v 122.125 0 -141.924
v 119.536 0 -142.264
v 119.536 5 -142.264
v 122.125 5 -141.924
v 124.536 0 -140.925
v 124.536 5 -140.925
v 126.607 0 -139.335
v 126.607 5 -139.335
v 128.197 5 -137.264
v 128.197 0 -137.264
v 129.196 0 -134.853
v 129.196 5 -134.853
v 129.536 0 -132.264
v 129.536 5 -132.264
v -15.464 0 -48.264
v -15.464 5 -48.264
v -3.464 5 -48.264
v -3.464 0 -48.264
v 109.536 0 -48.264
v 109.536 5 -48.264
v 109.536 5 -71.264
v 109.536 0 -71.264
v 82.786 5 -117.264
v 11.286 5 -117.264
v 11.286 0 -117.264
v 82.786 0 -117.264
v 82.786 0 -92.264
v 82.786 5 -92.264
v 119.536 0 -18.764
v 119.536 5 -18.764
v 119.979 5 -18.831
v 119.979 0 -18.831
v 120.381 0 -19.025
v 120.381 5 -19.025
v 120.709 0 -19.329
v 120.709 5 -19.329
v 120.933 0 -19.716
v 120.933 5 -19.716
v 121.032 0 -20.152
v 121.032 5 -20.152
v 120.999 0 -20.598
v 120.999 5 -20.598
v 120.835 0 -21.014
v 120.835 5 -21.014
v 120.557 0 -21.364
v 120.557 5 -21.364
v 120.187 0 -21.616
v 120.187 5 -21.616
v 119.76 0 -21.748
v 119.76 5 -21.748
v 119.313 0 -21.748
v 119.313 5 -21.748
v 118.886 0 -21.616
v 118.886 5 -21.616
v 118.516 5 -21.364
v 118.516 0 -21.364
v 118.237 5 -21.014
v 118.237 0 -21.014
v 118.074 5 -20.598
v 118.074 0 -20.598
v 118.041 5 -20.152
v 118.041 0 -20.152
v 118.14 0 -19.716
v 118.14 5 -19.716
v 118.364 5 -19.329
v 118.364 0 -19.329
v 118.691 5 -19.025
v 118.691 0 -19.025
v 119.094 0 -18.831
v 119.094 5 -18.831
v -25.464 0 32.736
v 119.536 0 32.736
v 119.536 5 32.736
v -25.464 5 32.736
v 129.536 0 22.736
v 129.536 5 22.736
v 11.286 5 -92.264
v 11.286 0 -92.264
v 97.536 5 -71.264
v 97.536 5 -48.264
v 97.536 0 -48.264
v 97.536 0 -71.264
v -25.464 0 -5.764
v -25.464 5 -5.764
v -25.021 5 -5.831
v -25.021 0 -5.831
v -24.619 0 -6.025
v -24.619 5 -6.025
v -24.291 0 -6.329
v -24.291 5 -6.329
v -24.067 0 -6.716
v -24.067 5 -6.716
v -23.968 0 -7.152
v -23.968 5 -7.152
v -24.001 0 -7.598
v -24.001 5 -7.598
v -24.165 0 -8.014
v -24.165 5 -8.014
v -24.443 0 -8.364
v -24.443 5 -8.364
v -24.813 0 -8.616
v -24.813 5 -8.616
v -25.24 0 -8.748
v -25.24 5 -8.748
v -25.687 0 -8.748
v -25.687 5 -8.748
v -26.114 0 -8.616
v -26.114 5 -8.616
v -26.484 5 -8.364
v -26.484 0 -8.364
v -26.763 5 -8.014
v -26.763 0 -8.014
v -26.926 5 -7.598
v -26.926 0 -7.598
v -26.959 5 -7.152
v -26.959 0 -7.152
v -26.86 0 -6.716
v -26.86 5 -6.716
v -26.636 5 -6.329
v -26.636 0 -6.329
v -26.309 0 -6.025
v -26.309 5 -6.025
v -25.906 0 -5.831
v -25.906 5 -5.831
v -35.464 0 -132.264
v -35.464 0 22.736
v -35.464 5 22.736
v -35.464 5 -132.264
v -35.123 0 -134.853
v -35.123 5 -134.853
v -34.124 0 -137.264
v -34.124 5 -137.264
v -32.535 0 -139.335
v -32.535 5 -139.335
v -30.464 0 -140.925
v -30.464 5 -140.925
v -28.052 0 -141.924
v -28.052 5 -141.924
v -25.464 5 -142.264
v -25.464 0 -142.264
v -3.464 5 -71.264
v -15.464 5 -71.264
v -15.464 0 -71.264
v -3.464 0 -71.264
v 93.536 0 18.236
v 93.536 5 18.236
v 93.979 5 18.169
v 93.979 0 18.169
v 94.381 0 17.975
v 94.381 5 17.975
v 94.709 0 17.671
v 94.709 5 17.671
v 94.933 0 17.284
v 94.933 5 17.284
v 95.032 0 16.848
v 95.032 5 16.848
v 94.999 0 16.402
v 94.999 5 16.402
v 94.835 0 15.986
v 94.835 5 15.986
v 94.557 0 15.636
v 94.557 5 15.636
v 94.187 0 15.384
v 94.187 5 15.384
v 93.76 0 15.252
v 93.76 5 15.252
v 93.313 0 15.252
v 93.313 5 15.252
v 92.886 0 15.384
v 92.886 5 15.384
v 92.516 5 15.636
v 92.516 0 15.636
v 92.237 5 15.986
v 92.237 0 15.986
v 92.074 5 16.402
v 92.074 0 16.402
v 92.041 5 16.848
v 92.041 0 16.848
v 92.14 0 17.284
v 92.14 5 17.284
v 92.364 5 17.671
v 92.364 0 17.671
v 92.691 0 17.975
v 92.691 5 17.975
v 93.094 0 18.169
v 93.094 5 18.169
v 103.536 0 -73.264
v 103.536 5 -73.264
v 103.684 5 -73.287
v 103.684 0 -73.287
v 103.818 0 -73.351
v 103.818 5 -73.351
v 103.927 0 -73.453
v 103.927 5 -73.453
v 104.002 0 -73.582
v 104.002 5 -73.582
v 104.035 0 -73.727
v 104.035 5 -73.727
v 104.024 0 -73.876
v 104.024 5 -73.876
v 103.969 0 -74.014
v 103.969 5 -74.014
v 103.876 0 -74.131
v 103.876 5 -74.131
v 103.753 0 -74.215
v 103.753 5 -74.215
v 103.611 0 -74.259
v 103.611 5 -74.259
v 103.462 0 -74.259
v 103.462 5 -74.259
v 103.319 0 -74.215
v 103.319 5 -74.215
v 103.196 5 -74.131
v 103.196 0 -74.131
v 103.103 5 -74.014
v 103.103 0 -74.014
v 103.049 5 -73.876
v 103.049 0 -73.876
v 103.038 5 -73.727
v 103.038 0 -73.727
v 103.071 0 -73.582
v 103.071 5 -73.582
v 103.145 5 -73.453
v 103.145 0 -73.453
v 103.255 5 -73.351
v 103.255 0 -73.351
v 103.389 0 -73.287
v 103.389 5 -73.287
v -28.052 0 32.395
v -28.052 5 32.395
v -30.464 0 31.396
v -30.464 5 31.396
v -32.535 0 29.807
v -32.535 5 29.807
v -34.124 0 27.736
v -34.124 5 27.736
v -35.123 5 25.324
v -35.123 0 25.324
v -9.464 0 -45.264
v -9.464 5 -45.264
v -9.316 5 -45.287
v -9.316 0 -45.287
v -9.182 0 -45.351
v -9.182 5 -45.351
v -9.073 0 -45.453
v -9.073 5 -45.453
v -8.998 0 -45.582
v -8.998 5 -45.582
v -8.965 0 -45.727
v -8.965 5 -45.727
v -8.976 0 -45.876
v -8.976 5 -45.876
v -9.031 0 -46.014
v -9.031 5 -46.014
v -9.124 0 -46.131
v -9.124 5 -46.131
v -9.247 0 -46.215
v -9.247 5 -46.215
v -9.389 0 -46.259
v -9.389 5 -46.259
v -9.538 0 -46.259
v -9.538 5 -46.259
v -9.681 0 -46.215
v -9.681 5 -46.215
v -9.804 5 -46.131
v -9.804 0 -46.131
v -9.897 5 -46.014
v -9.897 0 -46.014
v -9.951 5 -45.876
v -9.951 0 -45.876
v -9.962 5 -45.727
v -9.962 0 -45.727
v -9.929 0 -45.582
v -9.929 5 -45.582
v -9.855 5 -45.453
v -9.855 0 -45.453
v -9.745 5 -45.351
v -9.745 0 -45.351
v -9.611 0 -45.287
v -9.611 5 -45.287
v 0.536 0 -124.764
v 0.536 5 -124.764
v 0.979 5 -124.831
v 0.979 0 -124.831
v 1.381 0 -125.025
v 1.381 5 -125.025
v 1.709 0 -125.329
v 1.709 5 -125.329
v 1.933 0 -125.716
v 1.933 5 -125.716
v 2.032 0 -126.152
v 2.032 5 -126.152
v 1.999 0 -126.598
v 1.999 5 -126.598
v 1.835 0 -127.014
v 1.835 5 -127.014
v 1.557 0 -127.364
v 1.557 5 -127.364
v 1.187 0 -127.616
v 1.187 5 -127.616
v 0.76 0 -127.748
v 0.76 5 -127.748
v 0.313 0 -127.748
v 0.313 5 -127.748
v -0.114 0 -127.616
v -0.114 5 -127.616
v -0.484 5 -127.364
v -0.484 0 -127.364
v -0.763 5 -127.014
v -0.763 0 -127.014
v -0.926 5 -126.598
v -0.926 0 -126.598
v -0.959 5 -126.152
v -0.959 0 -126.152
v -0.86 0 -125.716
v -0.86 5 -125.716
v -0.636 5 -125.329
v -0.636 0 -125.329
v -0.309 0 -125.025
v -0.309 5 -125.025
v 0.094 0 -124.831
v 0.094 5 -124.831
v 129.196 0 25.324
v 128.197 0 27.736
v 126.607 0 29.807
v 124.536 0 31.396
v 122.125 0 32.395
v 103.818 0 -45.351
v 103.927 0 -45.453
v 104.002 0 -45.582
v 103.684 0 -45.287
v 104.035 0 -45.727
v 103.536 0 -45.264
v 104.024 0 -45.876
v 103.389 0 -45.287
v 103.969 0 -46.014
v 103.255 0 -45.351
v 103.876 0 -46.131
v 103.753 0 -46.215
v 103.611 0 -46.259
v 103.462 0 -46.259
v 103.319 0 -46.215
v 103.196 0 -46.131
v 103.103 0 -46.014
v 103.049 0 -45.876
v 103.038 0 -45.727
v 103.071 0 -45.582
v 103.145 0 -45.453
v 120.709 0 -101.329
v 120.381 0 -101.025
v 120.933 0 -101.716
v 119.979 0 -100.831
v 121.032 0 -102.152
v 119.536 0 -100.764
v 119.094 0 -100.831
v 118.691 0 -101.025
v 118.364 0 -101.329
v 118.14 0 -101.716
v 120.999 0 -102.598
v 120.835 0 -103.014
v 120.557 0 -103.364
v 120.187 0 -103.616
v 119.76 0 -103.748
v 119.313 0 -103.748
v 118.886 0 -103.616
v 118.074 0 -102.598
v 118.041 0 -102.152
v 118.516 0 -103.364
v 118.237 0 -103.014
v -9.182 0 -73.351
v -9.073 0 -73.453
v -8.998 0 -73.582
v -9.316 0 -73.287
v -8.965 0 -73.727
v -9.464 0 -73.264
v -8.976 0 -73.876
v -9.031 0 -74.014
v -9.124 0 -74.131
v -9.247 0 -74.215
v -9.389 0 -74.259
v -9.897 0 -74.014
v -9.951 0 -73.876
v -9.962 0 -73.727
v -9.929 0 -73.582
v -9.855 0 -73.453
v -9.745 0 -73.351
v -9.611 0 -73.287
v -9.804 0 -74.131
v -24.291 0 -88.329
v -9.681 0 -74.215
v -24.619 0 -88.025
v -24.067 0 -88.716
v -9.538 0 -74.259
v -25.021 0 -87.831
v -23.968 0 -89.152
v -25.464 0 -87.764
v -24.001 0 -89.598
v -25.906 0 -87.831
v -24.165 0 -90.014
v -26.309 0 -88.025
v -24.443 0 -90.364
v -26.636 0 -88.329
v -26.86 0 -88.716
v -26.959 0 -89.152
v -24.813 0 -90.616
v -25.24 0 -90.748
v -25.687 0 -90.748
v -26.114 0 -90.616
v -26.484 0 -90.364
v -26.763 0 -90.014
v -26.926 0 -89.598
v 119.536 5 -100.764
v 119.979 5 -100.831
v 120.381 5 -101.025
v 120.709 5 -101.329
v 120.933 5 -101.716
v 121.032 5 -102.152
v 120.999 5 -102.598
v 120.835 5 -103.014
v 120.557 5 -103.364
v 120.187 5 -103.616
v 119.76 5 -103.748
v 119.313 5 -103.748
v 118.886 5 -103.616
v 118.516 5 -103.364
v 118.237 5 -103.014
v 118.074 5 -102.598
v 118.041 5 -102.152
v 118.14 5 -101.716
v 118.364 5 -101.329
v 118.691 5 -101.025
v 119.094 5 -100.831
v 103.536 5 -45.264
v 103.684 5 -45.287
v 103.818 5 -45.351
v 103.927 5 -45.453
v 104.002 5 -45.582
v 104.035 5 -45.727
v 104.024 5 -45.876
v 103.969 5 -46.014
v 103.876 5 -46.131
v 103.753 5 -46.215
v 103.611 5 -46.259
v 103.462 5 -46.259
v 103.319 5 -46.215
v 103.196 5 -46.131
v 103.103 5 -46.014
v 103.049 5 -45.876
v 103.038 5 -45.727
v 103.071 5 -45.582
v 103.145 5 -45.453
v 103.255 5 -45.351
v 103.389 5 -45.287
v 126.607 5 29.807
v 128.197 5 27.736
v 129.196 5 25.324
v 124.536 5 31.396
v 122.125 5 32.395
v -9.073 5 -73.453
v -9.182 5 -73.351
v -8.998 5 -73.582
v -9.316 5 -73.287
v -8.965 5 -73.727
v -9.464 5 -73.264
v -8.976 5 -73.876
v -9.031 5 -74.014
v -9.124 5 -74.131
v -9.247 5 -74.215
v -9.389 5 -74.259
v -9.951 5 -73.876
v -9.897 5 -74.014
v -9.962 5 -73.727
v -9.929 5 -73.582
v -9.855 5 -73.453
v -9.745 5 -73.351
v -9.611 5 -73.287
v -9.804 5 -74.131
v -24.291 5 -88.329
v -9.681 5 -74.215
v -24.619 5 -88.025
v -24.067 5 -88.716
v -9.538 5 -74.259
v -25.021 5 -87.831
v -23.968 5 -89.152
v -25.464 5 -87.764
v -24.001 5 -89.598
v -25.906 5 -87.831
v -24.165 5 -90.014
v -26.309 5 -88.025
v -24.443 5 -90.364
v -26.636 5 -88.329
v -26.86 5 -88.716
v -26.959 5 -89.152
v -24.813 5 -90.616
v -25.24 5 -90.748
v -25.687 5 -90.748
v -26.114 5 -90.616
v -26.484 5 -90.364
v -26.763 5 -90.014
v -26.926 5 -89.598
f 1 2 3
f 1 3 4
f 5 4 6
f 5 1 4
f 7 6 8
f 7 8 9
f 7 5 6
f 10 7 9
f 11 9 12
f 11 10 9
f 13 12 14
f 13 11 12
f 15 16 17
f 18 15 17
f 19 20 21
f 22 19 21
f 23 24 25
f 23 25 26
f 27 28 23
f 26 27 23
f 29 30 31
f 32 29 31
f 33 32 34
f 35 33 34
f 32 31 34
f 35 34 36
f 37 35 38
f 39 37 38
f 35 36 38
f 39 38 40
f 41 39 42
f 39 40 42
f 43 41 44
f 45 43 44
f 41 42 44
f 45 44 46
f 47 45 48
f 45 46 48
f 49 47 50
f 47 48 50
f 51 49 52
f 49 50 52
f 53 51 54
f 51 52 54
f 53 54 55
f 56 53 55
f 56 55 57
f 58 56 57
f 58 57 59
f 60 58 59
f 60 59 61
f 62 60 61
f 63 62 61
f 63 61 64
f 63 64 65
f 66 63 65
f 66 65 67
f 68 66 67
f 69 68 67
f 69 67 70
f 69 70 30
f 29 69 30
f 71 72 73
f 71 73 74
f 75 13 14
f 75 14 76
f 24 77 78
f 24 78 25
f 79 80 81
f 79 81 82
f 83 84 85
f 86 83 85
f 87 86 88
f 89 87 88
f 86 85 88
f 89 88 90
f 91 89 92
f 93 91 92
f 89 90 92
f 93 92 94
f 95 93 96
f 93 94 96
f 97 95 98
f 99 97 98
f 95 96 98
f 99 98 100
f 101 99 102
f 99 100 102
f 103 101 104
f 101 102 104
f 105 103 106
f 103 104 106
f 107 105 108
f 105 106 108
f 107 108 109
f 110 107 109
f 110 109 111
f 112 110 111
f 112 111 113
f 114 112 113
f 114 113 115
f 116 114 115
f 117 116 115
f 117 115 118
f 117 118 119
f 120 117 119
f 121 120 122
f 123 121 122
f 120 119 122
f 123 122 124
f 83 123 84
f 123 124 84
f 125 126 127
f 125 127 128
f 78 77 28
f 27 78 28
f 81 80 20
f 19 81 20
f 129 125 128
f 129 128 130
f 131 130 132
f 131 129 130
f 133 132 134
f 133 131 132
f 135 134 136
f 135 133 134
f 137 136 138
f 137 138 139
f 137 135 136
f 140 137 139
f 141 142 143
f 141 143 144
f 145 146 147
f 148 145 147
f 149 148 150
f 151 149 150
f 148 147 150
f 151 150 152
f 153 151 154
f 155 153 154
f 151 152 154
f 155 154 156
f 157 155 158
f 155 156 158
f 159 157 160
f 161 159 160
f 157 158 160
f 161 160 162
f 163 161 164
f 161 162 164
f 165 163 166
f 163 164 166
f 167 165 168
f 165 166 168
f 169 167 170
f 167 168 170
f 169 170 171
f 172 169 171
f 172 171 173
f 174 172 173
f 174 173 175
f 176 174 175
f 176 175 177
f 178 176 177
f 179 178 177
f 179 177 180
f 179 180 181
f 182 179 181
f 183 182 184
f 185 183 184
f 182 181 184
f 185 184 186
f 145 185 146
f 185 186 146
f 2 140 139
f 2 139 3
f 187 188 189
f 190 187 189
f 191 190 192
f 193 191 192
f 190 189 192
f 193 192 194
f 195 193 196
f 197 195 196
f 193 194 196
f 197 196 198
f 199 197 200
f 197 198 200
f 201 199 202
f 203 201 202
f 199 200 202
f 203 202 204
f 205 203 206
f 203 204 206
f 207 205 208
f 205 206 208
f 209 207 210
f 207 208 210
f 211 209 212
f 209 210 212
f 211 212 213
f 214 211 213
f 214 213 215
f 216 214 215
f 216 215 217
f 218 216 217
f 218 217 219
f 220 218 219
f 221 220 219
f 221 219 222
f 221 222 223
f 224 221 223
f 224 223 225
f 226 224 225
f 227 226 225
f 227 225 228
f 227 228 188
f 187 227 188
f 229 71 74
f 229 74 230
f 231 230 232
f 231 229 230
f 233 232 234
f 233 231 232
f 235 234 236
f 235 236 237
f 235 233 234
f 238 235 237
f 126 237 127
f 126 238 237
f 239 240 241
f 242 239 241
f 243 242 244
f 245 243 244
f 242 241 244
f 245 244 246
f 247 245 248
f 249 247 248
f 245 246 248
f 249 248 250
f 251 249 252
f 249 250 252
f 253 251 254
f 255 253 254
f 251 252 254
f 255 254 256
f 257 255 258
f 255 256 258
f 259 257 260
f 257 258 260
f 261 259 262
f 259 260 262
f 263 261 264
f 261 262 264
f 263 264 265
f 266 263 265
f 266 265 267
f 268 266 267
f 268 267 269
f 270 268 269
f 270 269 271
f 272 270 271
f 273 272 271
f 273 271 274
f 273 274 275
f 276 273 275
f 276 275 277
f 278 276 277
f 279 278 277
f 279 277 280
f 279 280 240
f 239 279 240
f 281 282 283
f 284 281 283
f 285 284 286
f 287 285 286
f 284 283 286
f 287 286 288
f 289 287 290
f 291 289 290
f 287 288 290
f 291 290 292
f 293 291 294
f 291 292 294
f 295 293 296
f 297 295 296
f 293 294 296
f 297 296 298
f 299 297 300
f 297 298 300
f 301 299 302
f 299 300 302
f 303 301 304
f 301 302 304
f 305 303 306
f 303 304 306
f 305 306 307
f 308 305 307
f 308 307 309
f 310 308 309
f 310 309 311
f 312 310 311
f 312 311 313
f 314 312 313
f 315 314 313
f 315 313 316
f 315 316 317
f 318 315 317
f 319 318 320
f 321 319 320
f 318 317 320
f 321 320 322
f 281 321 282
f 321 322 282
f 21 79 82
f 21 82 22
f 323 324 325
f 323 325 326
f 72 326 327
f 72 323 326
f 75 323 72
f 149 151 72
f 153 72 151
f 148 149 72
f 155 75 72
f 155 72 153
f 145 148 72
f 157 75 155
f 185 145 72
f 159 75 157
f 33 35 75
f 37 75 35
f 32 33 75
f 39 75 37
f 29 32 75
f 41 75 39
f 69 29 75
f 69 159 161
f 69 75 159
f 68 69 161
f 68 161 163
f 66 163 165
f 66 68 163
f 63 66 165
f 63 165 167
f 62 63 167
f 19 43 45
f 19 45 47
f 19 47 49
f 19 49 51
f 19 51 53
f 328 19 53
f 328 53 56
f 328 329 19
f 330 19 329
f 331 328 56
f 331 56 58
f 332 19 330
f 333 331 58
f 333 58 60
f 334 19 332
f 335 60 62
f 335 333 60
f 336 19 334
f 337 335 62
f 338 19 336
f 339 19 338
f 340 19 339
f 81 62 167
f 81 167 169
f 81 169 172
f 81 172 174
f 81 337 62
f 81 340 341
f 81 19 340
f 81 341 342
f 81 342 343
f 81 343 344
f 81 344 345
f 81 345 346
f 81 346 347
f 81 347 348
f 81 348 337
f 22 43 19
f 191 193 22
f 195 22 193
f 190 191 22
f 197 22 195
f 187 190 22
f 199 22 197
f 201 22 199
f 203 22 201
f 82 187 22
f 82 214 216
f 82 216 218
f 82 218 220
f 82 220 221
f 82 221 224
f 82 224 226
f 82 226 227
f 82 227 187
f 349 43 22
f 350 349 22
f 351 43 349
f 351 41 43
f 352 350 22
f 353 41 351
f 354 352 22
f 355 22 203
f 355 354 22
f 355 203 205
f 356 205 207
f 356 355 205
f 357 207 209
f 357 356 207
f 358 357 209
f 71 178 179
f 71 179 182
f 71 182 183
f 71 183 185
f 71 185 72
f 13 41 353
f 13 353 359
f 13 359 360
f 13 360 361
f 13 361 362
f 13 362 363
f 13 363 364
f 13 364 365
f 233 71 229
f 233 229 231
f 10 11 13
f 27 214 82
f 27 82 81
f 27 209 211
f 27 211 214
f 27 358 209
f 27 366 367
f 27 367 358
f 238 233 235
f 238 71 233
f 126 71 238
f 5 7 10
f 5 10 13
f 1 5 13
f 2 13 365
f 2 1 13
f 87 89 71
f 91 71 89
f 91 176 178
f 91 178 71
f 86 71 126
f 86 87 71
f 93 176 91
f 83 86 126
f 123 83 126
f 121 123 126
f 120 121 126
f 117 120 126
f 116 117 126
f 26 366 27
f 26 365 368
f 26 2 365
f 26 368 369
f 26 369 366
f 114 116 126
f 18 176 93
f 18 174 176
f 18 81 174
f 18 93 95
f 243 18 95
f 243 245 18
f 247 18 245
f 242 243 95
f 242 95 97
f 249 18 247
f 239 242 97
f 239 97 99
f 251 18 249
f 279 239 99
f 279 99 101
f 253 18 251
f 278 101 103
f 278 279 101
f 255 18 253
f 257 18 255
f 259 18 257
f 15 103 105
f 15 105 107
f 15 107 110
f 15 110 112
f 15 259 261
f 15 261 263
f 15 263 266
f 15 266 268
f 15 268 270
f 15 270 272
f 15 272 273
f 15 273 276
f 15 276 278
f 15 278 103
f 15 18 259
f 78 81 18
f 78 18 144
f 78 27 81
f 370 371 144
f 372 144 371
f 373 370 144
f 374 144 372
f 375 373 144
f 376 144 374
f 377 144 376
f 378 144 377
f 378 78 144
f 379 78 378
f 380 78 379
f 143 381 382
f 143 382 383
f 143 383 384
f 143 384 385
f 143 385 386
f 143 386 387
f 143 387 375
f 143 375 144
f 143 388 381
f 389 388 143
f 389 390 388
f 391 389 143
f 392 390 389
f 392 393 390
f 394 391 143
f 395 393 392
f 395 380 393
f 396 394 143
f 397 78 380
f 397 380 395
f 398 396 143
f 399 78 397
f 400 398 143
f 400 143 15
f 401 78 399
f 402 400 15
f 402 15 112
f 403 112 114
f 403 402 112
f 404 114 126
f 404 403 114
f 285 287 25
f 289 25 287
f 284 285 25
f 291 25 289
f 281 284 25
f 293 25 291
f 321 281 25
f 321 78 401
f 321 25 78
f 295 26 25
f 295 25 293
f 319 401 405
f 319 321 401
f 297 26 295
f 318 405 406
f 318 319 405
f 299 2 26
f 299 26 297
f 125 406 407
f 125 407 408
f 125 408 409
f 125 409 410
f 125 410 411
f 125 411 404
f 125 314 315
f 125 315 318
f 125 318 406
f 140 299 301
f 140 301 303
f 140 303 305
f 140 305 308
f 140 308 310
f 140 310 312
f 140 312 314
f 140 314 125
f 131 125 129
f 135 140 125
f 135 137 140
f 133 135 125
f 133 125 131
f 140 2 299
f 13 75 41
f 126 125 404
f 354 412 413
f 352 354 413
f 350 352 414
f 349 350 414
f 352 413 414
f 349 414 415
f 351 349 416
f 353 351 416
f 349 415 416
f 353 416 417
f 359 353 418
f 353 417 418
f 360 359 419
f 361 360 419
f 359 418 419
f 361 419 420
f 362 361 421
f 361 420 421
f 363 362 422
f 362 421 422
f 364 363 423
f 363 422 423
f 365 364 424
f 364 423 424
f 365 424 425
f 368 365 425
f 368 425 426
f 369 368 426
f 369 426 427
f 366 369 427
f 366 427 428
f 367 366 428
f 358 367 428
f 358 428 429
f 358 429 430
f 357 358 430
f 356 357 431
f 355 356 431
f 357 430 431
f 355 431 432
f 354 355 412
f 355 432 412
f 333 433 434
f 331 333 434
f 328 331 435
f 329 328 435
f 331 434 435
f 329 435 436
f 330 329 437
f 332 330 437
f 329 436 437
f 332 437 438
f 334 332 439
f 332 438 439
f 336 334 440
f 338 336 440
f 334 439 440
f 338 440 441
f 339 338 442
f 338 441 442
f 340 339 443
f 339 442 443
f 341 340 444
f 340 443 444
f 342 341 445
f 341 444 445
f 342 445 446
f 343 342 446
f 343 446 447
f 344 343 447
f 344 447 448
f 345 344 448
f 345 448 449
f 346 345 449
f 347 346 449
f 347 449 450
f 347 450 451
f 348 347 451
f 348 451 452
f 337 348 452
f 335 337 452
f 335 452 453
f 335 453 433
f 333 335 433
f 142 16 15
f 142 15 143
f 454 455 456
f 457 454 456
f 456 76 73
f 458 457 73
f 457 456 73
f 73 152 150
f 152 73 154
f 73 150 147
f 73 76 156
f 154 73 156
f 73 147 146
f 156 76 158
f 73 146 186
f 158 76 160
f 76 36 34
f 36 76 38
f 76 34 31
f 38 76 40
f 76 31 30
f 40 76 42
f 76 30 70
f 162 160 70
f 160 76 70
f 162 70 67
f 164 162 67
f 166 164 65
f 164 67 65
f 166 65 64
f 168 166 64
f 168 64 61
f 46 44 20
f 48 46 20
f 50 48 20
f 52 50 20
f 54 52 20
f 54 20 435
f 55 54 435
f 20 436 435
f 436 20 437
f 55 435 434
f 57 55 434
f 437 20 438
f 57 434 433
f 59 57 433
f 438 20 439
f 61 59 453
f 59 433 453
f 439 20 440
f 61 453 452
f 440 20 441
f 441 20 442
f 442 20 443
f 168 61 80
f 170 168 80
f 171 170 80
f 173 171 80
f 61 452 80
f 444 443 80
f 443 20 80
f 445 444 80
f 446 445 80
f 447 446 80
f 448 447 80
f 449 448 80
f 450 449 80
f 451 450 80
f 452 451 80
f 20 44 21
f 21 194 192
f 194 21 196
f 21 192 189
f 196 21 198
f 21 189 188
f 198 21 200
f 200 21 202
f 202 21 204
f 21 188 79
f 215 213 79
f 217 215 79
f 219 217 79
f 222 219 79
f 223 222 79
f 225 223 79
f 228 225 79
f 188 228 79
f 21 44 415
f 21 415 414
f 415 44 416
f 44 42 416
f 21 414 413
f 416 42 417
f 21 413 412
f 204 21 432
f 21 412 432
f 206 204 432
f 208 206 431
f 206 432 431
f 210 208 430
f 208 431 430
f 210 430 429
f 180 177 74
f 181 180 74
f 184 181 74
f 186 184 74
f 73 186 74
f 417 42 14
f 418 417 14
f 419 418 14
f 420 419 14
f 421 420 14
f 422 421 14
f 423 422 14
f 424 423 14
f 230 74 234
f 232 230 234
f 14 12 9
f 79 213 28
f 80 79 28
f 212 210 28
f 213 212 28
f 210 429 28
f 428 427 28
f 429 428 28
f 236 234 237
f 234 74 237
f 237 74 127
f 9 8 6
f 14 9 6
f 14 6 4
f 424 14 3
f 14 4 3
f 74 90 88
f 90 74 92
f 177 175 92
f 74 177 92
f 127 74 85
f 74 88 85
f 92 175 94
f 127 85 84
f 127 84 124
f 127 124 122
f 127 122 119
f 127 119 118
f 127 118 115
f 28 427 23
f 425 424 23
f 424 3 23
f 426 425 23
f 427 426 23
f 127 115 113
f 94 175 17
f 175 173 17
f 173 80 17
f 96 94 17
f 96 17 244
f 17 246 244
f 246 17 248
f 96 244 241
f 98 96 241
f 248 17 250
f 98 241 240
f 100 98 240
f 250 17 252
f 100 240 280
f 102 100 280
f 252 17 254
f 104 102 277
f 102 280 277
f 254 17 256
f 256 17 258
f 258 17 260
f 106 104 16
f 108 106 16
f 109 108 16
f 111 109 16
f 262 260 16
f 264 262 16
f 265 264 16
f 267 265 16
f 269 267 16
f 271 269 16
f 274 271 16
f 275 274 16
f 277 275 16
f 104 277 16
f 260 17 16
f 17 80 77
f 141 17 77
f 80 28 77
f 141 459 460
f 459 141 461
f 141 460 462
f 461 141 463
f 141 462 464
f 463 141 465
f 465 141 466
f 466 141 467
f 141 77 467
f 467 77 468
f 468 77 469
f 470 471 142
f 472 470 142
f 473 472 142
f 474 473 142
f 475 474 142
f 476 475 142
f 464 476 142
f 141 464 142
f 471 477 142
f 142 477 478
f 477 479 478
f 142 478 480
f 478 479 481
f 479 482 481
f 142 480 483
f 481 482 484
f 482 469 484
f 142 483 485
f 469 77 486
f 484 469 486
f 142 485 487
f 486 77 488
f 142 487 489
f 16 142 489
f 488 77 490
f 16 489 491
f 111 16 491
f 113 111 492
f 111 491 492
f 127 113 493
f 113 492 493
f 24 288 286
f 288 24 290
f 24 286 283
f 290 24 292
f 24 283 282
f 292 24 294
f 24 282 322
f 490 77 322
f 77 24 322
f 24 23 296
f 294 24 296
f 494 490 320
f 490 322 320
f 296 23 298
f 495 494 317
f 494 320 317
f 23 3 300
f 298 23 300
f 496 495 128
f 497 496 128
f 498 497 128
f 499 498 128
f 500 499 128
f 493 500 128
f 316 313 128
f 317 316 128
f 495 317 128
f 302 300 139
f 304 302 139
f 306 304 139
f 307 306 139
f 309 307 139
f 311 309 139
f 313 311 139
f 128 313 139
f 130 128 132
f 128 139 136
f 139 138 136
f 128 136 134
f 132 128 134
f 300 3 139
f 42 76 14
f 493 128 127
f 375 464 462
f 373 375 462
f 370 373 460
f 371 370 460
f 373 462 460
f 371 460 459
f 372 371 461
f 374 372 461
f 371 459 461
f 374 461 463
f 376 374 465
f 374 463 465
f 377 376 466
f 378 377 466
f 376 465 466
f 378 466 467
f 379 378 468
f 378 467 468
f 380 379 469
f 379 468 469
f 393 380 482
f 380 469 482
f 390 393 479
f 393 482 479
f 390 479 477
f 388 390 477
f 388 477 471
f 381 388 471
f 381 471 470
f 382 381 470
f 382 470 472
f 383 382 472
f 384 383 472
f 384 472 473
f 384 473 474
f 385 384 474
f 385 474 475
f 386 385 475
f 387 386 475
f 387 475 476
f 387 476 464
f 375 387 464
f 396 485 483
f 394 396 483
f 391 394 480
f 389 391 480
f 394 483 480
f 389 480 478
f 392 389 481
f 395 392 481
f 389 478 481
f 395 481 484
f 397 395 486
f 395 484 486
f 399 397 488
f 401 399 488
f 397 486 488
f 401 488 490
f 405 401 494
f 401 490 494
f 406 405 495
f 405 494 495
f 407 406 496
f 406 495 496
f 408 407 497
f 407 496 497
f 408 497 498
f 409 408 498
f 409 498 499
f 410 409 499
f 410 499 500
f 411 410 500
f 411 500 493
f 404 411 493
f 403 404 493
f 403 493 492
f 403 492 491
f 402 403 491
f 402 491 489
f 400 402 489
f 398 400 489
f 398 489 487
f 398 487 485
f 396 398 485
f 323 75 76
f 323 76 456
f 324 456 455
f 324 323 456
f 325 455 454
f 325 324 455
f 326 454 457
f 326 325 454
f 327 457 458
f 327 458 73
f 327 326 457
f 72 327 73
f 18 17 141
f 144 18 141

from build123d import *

# Parameters (mm, degrees)
RESSALTO_EXTRUS_O1_DEPTH = 5
ESBO_O2_R                = 1.5
CORTE_EXTRUS_O1_DEPTH    = 5
ESBO_O4_R                = 0.5
ESBO_O4_W                = 12
ESBO_O4_H                = 23
CORTE_EXTRUS_O3_DEPTH    = 193.467750623
ESBO_O5_R                = 1.5
ESBO_O5_W                = 71.5
ESBO_O5_H                = 25
CORTE_EXTRUS_O4_DEPTH    = 193.467750623


with BuildPart() as part:
    # Esboço1 → Ressalto-extrusão1 (new body)
    with BuildSketch(Plane(origin=(0, 0, 0), x_dir=(1, 0, 0), z_dir=(0, 1, 0))):
        with BuildLine():
            Line((-25.463589741, 142.264378701), (119.536410259, 142.264378701))
            ThreePointArc((119.536410259, 142.264378701), (126.607478071, 139.335446513), (129.536410259, 132.264378701))
            Line((129.536410259, 132.264378701), (129.536410259, -22.735621299))
            ThreePointArc((129.536410259, -22.735621299), (126.607478071, -29.806689111), (119.536410259, -32.735621299))
            Line((119.536410259, -32.735621299), (-25.463589741, -32.735621299))
            ThreePointArc((-25.463589741, -32.735621299), (-32.534657553, -29.806689111), (-35.463589741, -22.735621299))
            Line((-35.463589741, -22.735621299), (-35.463589741, 132.264378701))
            ThreePointArc((-35.463589741, 132.264378701), (-32.534657553, 139.335446513), (-25.463589741, 142.264378701))
        make_face()
    extrude(amount=RESSALTO_EXTRUS_O1_DEPTH)

    # Esboço2 → Corte-extrusão1 (cut)
    with BuildSketch(Plane(origin=(0, 5, 0), x_dir=(1, 0, 0), z_dir=(0, 1, 0))):
        with Locations(Location((-25.463589741, 7.264378701, 0), (0, 0, 270))):
            Circle(ESBO_O2_R)
        with Locations(Location((0.536410259, 126.264378701, 0), (0, 0, 270))):
            Circle(ESBO_O2_R)
        with Locations(Location((119.536410259, 102.264378701, 0), (0, 0, 270))):
            Circle(ESBO_O2_R)
        with Locations(Location((93.536410259, -16.735621299, 0), (0, 0, 270))):
            Circle(ESBO_O2_R)
    extrude(amount=-CORTE_EXTRUS_O1_DEPTH, mode=Mode.SUBTRACT)

    # Esboço4 → Corte-extrusão3 (cut, through all)
    with BuildSketch(Plane(origin=(0, 5, 0), x_dir=(1, 0, 0), z_dir=(0, 1, 0))):
        with Locations(Location((-9.463589741, 45.764378701, 0), (0, 0, 270))):
            Circle(ESBO_O4_R)
        with Locations(Location((-9.463589741, 73.764378701, 0), (0, 0, 270))):
            Circle(ESBO_O4_R)
        with Locations(Location((103.536410259, 45.764378701, 0), (0, 0, 270))):
            Circle(ESBO_O4_R)
        with Locations(Location((103.536410259, 73.764378701, 0), (0, 0, 270))):
            Circle(ESBO_O4_R)
        with Locations((-9.463589741, 59.764378701)):
            Rectangle(ESBO_O4_W, ESBO_O4_H)
        with Locations((103.536410259, 59.764378701)):
            Rectangle(ESBO_O4_W, ESBO_O4_H)
    extrude(amount=-CORTE_EXTRUS_O3_DEPTH, mode=Mode.SUBTRACT)

    # Esboço5 → Corte-extrusão4 (cut, through all)
    with BuildSketch(Plane(origin=(0, 5, 0), x_dir=(1, 0, 0), z_dir=(0, 1, 0))):
        with Locations(Location((-25.463589741, 89.264378701, 0), (0, 0, 270))):
            Circle(ESBO_O5_R)
        with Locations(Location((119.536410259, 20.264378701, 0), (0, 0, 270))):
            Circle(ESBO_O5_R)
        with Locations((47.036410259, 104.764378701)):
            Rectangle(ESBO_O5_W, ESBO_O5_H)
    extrude(amount=-CORTE_EXTRUS_O4_DEPTH, mode=Mode.SUBTRACT)


solid = part.part
